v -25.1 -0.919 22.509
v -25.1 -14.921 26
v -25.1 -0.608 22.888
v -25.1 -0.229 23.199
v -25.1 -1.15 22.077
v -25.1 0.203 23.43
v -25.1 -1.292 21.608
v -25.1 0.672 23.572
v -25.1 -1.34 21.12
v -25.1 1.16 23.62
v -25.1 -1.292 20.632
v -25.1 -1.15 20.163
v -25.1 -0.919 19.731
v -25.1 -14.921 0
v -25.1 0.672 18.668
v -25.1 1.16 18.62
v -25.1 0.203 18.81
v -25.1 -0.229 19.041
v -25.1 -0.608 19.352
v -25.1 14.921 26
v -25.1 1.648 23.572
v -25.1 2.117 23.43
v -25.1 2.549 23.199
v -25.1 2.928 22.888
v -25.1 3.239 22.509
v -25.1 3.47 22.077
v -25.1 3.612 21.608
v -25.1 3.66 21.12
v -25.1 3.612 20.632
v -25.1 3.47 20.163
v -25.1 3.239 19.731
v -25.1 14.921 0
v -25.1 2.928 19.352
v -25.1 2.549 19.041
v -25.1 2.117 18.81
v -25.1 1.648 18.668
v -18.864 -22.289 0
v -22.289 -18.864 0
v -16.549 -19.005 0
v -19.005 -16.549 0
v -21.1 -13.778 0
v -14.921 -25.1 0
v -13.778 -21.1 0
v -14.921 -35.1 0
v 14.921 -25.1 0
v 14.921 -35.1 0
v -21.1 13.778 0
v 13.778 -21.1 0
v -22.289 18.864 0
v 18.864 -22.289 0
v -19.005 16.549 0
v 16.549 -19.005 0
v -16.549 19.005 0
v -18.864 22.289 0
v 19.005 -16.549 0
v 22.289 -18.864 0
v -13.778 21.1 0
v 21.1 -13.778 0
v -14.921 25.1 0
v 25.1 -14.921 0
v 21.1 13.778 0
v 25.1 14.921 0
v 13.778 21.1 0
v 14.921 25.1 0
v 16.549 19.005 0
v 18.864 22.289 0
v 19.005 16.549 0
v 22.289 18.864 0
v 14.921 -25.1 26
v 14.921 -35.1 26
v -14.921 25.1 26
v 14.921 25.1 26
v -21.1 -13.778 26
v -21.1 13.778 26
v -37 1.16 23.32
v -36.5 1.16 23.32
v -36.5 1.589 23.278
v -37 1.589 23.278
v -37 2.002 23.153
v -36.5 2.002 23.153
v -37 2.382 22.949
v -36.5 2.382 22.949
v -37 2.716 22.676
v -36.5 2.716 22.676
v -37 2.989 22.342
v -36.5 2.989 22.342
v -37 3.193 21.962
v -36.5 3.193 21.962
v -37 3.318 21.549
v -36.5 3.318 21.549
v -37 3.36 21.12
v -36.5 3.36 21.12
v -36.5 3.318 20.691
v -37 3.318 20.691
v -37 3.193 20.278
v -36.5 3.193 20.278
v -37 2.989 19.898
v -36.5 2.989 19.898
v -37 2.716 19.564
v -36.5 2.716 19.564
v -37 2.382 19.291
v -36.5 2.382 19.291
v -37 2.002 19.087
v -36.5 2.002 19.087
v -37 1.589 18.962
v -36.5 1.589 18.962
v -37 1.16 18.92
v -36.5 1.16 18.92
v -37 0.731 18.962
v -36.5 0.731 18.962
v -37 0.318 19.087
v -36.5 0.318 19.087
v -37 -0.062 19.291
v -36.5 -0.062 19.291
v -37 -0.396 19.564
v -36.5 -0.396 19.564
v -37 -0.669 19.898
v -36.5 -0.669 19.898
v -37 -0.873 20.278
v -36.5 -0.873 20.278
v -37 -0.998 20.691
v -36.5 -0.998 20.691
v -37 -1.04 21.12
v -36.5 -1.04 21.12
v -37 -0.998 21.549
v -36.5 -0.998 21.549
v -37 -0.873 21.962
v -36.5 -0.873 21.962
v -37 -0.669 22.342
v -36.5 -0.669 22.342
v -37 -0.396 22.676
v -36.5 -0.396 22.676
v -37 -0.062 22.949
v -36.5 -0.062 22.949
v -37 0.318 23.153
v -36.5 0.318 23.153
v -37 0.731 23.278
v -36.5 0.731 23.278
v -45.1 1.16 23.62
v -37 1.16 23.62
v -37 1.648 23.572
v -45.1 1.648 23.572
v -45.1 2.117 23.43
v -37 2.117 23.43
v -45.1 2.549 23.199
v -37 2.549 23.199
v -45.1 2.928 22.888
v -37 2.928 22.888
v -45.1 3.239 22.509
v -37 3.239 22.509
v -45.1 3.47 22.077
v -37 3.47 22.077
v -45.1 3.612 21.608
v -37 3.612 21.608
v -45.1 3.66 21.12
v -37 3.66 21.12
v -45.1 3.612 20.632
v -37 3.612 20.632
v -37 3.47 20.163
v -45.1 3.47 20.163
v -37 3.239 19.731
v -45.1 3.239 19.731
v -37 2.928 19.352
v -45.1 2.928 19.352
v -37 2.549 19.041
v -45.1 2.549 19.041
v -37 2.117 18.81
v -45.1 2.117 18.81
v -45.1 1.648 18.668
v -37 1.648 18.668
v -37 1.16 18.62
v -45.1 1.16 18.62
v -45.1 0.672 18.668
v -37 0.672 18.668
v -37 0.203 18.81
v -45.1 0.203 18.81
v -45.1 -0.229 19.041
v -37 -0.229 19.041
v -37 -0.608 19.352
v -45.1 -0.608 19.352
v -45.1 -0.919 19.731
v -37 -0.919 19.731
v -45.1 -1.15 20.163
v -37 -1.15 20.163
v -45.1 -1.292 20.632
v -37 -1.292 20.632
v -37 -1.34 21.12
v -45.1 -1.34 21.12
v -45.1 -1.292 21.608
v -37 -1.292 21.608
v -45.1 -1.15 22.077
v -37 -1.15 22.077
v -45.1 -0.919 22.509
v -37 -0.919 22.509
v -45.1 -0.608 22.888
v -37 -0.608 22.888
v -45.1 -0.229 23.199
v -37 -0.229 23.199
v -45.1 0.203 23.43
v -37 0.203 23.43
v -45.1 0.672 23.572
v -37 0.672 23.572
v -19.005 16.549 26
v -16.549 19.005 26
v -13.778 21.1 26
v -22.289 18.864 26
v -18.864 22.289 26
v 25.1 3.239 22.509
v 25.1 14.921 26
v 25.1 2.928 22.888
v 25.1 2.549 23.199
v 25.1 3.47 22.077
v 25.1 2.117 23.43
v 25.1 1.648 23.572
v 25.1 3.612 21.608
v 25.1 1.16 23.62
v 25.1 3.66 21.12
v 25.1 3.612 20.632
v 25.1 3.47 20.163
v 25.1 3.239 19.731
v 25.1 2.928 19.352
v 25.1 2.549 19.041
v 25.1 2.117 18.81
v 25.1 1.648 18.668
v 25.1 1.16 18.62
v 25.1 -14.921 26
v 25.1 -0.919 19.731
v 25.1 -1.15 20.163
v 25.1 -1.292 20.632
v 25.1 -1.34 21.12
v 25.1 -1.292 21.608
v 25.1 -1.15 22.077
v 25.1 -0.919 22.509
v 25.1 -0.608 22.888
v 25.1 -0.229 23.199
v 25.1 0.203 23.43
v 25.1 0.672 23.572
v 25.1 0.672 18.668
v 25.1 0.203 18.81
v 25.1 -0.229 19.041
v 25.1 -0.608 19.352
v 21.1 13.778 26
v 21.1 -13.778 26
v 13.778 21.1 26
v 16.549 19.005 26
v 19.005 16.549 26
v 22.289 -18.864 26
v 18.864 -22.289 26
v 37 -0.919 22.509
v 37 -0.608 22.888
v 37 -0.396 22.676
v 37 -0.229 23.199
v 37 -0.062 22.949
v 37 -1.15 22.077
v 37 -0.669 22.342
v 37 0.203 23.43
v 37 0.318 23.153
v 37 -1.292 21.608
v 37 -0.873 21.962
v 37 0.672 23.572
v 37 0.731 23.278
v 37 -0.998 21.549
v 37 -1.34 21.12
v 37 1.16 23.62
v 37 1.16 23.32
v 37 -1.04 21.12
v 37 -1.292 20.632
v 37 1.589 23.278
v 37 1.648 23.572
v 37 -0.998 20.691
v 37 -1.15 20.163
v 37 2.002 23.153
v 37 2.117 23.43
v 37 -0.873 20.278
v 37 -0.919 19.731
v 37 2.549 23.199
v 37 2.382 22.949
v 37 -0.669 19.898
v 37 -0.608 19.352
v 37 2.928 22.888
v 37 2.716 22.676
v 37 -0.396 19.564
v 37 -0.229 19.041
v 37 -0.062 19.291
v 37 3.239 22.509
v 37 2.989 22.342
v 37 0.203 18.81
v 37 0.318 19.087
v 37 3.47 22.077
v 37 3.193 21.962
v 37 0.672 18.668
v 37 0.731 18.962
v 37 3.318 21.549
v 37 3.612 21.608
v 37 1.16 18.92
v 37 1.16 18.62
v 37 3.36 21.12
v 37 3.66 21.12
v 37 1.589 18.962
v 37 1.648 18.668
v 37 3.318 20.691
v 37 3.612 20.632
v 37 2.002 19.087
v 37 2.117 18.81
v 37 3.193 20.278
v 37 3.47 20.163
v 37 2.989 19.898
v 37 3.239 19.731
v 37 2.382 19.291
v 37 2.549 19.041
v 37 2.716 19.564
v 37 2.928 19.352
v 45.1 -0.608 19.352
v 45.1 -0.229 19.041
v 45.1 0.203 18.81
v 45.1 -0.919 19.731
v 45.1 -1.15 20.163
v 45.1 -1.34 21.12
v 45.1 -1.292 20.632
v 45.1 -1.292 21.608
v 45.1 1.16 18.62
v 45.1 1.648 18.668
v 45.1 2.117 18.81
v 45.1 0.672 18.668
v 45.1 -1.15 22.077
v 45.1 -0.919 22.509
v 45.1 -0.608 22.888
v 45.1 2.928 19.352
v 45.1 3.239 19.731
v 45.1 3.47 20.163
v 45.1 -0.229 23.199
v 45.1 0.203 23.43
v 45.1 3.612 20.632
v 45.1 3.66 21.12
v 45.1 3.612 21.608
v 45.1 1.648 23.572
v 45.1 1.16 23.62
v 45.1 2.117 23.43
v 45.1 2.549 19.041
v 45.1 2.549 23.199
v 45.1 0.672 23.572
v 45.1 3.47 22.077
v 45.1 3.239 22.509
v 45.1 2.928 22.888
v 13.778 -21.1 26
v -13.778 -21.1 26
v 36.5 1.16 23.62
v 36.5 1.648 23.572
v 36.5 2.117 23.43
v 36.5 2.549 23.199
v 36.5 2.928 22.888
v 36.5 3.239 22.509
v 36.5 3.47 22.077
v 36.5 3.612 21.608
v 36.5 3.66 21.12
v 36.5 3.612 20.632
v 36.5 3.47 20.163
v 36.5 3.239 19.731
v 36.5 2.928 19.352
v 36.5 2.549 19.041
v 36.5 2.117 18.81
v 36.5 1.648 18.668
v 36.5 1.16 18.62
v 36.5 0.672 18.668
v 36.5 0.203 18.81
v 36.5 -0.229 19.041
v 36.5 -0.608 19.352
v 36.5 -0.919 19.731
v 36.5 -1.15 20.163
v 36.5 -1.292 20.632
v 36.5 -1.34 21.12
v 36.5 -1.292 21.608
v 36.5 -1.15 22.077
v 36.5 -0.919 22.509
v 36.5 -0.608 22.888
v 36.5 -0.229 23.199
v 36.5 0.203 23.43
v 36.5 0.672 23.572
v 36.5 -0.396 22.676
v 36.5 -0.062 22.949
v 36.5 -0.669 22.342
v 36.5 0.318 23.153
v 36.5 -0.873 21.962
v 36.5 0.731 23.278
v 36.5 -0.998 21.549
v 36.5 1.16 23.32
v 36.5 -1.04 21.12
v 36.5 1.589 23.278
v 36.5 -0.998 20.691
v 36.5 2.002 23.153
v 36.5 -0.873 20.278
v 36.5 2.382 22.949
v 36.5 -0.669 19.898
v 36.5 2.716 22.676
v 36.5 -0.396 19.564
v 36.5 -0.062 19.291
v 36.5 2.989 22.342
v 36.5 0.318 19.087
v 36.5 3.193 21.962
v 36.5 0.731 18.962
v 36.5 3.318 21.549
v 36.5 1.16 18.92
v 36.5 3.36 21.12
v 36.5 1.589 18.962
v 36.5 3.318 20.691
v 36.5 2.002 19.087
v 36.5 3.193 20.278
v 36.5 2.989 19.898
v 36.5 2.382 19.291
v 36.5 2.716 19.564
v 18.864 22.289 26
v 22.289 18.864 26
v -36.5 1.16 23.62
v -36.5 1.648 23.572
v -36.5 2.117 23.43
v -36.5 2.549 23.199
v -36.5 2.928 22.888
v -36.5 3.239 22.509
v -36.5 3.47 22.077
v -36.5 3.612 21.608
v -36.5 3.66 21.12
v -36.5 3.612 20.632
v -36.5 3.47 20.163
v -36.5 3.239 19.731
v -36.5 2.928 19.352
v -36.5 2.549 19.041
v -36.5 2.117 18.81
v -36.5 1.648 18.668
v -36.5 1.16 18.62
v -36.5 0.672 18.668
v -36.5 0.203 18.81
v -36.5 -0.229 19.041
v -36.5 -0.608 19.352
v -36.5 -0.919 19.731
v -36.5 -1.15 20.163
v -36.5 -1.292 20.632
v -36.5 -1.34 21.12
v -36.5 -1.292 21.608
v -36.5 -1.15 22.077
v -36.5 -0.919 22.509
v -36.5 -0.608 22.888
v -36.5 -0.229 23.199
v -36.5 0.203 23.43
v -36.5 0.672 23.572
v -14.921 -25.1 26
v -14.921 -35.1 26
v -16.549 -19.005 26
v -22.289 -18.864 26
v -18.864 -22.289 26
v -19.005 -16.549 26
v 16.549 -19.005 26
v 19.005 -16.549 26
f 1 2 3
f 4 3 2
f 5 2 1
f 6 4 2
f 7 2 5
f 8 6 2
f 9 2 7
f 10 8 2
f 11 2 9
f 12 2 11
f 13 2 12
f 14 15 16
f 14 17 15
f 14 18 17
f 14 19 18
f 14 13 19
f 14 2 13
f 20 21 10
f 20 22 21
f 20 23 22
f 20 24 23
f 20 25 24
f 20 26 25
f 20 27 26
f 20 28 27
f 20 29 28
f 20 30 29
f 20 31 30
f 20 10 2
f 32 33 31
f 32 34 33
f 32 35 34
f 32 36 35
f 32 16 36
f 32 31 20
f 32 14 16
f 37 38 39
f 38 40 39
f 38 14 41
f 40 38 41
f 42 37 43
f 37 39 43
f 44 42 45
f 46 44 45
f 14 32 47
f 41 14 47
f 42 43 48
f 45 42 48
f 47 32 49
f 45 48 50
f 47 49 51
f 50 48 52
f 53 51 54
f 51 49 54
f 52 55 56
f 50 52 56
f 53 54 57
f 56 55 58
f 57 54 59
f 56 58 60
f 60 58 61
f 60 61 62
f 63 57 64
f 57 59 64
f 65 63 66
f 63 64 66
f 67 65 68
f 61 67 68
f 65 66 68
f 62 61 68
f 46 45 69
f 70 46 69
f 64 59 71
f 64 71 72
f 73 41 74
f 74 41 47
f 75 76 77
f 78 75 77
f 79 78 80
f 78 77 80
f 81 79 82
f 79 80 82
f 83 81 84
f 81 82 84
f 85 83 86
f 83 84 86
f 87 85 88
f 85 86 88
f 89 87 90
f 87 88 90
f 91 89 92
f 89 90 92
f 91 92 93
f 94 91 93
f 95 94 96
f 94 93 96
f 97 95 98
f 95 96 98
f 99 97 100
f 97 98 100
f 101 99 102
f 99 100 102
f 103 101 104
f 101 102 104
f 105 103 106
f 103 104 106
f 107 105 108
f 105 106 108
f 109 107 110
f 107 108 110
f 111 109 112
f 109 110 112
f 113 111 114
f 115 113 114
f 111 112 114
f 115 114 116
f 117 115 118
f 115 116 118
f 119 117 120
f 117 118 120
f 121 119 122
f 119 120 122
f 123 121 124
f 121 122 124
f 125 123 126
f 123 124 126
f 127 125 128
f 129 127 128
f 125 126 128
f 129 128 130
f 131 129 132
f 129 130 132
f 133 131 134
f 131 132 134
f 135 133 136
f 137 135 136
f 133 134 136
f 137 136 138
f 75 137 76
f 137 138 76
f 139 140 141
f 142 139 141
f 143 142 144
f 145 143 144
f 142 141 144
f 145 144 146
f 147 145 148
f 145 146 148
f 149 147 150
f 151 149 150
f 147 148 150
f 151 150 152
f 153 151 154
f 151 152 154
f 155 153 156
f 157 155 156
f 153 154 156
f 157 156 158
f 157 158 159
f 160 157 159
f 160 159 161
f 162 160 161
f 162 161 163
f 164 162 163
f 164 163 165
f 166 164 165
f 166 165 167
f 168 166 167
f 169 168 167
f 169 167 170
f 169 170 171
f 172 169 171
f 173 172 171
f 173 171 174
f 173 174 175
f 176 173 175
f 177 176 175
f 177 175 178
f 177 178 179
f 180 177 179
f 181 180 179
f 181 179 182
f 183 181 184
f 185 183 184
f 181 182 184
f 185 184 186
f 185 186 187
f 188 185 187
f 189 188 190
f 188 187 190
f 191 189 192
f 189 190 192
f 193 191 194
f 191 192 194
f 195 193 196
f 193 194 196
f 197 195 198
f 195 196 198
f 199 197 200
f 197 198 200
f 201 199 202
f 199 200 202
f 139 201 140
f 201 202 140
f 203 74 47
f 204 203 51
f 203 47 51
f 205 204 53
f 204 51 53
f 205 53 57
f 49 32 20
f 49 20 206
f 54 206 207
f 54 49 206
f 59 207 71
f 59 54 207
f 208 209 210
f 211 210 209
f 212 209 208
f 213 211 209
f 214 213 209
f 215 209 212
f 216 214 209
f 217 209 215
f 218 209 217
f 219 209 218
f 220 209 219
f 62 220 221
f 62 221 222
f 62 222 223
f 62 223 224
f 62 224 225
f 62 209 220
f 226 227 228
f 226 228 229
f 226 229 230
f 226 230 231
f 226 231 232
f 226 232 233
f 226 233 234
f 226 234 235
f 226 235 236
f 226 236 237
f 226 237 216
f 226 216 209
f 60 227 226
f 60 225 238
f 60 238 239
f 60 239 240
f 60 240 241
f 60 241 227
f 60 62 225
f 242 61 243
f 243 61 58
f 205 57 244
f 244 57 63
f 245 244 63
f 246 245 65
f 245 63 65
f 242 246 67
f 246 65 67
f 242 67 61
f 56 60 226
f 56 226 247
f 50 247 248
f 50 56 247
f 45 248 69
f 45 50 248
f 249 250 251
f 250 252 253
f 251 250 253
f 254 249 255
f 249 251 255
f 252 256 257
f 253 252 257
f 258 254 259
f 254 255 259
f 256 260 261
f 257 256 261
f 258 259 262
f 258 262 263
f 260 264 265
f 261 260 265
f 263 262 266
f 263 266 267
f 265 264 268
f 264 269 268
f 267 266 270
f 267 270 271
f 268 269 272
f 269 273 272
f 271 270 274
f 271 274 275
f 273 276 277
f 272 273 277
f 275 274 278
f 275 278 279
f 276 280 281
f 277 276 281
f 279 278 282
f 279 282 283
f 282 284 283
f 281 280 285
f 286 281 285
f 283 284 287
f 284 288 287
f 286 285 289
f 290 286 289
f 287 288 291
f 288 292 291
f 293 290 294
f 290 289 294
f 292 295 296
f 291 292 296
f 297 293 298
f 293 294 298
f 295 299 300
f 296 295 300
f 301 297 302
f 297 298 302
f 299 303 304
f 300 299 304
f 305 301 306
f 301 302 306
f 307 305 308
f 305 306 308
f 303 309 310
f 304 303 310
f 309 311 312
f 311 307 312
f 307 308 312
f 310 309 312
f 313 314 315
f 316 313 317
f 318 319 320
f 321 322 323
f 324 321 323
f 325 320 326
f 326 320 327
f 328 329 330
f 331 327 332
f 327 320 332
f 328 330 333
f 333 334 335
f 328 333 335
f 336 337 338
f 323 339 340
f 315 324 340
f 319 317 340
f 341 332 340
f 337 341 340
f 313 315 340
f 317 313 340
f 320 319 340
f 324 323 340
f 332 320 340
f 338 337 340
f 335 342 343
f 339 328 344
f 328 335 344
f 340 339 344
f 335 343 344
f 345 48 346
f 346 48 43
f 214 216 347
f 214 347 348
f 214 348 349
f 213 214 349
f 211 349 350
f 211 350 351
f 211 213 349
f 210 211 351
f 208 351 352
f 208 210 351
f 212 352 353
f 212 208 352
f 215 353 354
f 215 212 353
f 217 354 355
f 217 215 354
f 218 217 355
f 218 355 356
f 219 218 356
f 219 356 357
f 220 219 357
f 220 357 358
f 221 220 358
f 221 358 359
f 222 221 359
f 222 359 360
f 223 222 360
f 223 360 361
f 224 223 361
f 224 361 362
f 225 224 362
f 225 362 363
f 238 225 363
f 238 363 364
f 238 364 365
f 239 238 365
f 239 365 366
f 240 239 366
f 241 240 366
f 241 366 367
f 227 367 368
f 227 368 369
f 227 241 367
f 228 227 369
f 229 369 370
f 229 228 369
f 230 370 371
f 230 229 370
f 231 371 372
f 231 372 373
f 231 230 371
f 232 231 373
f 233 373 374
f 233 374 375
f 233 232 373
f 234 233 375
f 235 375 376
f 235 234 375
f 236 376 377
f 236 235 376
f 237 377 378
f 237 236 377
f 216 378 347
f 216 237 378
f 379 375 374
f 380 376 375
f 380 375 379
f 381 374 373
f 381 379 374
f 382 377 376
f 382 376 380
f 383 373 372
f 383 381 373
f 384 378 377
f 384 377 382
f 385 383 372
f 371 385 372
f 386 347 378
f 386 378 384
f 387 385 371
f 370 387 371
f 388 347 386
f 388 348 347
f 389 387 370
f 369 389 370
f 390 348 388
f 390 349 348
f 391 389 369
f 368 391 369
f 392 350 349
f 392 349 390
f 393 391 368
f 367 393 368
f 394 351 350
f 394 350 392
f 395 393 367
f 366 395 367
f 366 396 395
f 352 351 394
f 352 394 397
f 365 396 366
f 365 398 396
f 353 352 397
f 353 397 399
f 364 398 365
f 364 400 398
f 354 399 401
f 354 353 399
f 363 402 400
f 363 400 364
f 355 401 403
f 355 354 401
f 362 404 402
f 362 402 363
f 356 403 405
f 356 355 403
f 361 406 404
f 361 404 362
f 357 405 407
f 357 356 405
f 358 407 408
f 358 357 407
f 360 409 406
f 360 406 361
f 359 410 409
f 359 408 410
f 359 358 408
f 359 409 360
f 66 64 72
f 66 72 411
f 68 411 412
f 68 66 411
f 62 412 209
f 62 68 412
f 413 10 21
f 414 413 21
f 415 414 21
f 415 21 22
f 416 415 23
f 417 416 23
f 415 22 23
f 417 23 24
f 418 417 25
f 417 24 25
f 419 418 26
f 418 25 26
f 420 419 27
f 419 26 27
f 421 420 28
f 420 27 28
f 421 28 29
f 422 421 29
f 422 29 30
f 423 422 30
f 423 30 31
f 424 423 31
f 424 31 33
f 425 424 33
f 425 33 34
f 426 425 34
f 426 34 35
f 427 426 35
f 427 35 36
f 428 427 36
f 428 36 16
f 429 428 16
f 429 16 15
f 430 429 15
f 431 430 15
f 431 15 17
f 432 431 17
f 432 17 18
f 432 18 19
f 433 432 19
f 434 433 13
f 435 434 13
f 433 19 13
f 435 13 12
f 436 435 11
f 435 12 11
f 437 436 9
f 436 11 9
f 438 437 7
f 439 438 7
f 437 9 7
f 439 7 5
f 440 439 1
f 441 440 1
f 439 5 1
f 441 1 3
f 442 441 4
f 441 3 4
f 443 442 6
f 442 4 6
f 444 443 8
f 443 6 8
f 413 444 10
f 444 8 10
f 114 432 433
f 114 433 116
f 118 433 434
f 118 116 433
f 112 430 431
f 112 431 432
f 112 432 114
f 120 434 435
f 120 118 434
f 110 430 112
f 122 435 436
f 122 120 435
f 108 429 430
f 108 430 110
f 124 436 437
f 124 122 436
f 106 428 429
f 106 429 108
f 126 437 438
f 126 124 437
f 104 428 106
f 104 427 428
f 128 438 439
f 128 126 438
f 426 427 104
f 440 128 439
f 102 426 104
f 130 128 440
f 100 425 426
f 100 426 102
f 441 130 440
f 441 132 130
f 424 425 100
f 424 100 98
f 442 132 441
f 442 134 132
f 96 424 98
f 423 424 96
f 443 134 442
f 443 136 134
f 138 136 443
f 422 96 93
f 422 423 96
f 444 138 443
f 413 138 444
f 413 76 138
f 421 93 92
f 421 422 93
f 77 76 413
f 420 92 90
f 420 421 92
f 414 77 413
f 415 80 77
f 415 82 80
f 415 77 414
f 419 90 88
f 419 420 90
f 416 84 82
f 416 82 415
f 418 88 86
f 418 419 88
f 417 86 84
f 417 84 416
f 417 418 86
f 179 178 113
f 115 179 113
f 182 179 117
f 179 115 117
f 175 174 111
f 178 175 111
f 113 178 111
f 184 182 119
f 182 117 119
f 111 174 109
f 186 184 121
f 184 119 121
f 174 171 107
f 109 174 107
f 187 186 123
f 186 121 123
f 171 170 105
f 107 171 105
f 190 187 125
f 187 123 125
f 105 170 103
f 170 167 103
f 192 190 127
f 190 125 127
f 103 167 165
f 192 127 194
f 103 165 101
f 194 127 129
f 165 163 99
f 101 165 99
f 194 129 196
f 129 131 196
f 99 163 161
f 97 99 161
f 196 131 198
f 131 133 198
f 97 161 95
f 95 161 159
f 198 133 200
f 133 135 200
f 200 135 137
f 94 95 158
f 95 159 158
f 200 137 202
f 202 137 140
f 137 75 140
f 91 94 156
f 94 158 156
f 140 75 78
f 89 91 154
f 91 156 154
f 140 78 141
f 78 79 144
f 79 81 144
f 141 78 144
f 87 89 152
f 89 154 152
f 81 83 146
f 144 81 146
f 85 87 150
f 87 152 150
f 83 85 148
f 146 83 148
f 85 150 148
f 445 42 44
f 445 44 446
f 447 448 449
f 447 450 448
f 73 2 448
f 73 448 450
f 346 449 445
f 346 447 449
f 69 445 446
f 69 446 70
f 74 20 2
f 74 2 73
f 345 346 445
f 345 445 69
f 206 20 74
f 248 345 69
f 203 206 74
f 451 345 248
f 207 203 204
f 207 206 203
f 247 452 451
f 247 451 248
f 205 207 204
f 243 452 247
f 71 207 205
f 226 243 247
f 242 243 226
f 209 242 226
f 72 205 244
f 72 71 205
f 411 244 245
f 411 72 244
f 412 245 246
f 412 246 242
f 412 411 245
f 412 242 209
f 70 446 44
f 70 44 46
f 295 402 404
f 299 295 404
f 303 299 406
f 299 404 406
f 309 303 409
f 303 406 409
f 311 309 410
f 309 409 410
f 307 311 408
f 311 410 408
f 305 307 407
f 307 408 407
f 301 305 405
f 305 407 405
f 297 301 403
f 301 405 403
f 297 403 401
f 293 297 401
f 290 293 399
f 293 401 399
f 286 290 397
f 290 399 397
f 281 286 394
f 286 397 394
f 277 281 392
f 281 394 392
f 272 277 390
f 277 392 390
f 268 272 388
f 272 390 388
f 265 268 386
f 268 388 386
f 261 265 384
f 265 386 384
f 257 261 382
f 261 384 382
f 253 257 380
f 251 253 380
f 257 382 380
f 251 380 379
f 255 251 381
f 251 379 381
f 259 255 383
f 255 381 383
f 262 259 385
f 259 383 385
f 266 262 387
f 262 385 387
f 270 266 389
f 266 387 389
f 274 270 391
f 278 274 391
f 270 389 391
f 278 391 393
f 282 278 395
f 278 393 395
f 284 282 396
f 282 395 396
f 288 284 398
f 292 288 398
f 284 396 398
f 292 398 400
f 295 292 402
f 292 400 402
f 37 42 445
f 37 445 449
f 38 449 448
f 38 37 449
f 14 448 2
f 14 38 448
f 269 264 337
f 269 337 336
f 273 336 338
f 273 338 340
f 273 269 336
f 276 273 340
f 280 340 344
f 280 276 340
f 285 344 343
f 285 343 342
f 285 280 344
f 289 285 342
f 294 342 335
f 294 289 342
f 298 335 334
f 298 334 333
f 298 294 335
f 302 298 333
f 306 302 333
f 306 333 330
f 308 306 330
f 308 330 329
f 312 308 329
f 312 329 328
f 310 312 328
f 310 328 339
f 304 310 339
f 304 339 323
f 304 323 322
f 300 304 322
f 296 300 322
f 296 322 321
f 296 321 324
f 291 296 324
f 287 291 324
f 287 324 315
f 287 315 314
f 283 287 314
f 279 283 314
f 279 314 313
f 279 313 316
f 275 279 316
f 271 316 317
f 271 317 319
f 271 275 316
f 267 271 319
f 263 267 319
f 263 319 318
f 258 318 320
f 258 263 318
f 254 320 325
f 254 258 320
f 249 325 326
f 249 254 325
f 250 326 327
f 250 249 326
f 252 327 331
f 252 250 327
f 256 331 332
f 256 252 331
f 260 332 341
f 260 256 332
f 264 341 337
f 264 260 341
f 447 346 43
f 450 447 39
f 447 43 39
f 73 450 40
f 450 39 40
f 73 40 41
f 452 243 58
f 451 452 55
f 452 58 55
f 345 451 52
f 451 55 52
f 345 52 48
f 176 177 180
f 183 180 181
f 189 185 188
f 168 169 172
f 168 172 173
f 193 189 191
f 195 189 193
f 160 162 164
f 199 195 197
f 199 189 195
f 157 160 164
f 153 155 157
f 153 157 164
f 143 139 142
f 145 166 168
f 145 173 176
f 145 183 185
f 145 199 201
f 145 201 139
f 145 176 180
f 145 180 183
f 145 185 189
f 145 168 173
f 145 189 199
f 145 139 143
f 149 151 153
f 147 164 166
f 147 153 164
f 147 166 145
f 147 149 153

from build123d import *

# Parameters (mm, degrees)
EXTRUDE_THIN1_DEPTH        = 26
SKETCH2_R                  = 2.5
BOSS_EXTRUDE1_DEPTH        = 20
BOSS_EXTRUDE2_START        = -50.2
SKETCH2_3_R                = 2.5
BOSS_EXTRUDE2_DEPTH        = 20
SKETCH3_W                  = 29.841581728
SKETCH3_H                  = 26
BOSS_EXTRUDE3_DEPTH        = 10
WYTNIJ_WYCI_GNI_CIE1_START = -8.6
SZKIC1_R                   = 2.5
SZKIC1_R_2                 = 2.2
WYTNIJ_WYCI_GNI_CIE1_DEPTH = 0.5
WYTNIJ_WYCI_GNI_CIE2_START = -8.6
SZKIC2_R                   = 2.5
SZKIC2_R_2                 = 2.2
WYTNIJ_WYCI_GNI_CIE2_DEPTH = 0.5


with BuildPart() as part:
    # Sketch1 → Extrude-Thin1 (new body)
    with BuildSketch(Plane.XY):
        with BuildLine():
            Line((-25.1, -14.920790864), (-25.1, 14.920790864))
            ThreePointArc((-25.1, 14.920790864), (-20.647518011, 20.647518011), (-14.920790864, 25.1))
            Line((-14.920790864, 25.1), (14.920790864, 25.1))
            ThreePointArc((14.920790864, 25.1), (20.647518011, 20.647518011), (25.1, 14.920790864))
            Line((25.1, 14.920790864), (25.1, -14.920790864))
            ThreePointArc((25.1, -14.920790864), (20.647518011, -20.647518011), (14.920790864, -25.1))
            Line((14.920790864, -25.1), (-14.920790864, -25.1))
            ThreePointArc((-14.920790864, -25.1), (-20.647518011, -20.647518011), (-25.1, -14.920790864))
        make_face()
        with BuildLine():
            Line((-21.1, -13.777880824), (-21.1, 13.777880824))
            ThreePointArc((-21.1, 13.777880824), (-17.819090886, 17.819090886), (-13.777880824, 21.1))
            Line((-13.777880824, 21.1), (13.777880824, 21.1))
            ThreePointArc((13.777880824, 21.1), (17.819090886, 17.819090886), (21.1, 13.777880824))
            Line((21.1, 13.777880824), (21.1, -13.777880824))
            ThreePointArc((21.1, -13.777880824), (17.819090886, -17.819090886), (13.777880824, -21.1))
            Line((13.777880824, -21.1), (-13.777880824, -21.1))
            ThreePointArc((-13.777880824, -21.1), (-17.819090886, -17.819090886), (-21.1, -13.777880824))
        make_face(mode=Mode.SUBTRACT)
    extrude(amount=EXTRUDE_THIN1_DEPTH)

    # Sketch2 → Boss-Extrude1 (add)
    with BuildSketch(Plane.ZY.offset(25.1)):
        with Locations((21.12, 1.16)):
            Circle(SKETCH2_R)
    extrude(amount=BOSS_EXTRUDE1_DEPTH)

    # Sketch2<3> → Boss-Extrude2 (add)
    with BuildSketch(Plane.ZY.offset(25.1).offset(BOSS_EXTRUDE2_START)):
        with Locations((21.12, 1.16)):
            Circle(SKETCH2_3_R)
    extrude(amount=-BOSS_EXTRUDE2_DEPTH)

    # Sketch3 → Boss-Extrude3 (add)
    with BuildSketch(Plane.XZ.offset(25.1)):
        with Locations((0, 13)):
            Rectangle(SKETCH3_W, SKETCH3_H)
    extrude(amount=BOSS_EXTRUDE3_DEPTH)

    # Szkic1 → Wytnij-wyciągnięcie1 (cut)
    with BuildSketch(Plane(origin=(45.1, 0, 0), x_dir=(0, 0, -1), z_dir=(1, 0, 0)).offset(WYTNIJ_WYCI_GNI_CIE1_START)):
        with Locations((-21.12, 1.16)):
            Circle(SZKIC1_R)
        with Locations((-21.12, 1.16)):
            Circle(SZKIC1_R_2, mode=Mode.SUBTRACT)
    extrude(amount=WYTNIJ_WYCI_GNI_CIE1_DEPTH, mode=Mode.SUBTRACT)

    # Szkic2 → Wytnij-wyciągnięcie2 (cut)
    with BuildSketch(Plane.ZY.offset(45.1).offset(WYTNIJ_WYCI_GNI_CIE2_START)):
        with Locations((21.12, 1.16)):
            Circle(SZKIC2_R)
        with Locations((21.12, 1.16)):
            Circle(SZKIC2_R_2, mode=Mode.SUBTRACT)
    extrude(amount=WYTNIJ_WYCI_GNI_CIE2_DEPTH, mode=Mode.SUBTRACT)


solid = part.part
